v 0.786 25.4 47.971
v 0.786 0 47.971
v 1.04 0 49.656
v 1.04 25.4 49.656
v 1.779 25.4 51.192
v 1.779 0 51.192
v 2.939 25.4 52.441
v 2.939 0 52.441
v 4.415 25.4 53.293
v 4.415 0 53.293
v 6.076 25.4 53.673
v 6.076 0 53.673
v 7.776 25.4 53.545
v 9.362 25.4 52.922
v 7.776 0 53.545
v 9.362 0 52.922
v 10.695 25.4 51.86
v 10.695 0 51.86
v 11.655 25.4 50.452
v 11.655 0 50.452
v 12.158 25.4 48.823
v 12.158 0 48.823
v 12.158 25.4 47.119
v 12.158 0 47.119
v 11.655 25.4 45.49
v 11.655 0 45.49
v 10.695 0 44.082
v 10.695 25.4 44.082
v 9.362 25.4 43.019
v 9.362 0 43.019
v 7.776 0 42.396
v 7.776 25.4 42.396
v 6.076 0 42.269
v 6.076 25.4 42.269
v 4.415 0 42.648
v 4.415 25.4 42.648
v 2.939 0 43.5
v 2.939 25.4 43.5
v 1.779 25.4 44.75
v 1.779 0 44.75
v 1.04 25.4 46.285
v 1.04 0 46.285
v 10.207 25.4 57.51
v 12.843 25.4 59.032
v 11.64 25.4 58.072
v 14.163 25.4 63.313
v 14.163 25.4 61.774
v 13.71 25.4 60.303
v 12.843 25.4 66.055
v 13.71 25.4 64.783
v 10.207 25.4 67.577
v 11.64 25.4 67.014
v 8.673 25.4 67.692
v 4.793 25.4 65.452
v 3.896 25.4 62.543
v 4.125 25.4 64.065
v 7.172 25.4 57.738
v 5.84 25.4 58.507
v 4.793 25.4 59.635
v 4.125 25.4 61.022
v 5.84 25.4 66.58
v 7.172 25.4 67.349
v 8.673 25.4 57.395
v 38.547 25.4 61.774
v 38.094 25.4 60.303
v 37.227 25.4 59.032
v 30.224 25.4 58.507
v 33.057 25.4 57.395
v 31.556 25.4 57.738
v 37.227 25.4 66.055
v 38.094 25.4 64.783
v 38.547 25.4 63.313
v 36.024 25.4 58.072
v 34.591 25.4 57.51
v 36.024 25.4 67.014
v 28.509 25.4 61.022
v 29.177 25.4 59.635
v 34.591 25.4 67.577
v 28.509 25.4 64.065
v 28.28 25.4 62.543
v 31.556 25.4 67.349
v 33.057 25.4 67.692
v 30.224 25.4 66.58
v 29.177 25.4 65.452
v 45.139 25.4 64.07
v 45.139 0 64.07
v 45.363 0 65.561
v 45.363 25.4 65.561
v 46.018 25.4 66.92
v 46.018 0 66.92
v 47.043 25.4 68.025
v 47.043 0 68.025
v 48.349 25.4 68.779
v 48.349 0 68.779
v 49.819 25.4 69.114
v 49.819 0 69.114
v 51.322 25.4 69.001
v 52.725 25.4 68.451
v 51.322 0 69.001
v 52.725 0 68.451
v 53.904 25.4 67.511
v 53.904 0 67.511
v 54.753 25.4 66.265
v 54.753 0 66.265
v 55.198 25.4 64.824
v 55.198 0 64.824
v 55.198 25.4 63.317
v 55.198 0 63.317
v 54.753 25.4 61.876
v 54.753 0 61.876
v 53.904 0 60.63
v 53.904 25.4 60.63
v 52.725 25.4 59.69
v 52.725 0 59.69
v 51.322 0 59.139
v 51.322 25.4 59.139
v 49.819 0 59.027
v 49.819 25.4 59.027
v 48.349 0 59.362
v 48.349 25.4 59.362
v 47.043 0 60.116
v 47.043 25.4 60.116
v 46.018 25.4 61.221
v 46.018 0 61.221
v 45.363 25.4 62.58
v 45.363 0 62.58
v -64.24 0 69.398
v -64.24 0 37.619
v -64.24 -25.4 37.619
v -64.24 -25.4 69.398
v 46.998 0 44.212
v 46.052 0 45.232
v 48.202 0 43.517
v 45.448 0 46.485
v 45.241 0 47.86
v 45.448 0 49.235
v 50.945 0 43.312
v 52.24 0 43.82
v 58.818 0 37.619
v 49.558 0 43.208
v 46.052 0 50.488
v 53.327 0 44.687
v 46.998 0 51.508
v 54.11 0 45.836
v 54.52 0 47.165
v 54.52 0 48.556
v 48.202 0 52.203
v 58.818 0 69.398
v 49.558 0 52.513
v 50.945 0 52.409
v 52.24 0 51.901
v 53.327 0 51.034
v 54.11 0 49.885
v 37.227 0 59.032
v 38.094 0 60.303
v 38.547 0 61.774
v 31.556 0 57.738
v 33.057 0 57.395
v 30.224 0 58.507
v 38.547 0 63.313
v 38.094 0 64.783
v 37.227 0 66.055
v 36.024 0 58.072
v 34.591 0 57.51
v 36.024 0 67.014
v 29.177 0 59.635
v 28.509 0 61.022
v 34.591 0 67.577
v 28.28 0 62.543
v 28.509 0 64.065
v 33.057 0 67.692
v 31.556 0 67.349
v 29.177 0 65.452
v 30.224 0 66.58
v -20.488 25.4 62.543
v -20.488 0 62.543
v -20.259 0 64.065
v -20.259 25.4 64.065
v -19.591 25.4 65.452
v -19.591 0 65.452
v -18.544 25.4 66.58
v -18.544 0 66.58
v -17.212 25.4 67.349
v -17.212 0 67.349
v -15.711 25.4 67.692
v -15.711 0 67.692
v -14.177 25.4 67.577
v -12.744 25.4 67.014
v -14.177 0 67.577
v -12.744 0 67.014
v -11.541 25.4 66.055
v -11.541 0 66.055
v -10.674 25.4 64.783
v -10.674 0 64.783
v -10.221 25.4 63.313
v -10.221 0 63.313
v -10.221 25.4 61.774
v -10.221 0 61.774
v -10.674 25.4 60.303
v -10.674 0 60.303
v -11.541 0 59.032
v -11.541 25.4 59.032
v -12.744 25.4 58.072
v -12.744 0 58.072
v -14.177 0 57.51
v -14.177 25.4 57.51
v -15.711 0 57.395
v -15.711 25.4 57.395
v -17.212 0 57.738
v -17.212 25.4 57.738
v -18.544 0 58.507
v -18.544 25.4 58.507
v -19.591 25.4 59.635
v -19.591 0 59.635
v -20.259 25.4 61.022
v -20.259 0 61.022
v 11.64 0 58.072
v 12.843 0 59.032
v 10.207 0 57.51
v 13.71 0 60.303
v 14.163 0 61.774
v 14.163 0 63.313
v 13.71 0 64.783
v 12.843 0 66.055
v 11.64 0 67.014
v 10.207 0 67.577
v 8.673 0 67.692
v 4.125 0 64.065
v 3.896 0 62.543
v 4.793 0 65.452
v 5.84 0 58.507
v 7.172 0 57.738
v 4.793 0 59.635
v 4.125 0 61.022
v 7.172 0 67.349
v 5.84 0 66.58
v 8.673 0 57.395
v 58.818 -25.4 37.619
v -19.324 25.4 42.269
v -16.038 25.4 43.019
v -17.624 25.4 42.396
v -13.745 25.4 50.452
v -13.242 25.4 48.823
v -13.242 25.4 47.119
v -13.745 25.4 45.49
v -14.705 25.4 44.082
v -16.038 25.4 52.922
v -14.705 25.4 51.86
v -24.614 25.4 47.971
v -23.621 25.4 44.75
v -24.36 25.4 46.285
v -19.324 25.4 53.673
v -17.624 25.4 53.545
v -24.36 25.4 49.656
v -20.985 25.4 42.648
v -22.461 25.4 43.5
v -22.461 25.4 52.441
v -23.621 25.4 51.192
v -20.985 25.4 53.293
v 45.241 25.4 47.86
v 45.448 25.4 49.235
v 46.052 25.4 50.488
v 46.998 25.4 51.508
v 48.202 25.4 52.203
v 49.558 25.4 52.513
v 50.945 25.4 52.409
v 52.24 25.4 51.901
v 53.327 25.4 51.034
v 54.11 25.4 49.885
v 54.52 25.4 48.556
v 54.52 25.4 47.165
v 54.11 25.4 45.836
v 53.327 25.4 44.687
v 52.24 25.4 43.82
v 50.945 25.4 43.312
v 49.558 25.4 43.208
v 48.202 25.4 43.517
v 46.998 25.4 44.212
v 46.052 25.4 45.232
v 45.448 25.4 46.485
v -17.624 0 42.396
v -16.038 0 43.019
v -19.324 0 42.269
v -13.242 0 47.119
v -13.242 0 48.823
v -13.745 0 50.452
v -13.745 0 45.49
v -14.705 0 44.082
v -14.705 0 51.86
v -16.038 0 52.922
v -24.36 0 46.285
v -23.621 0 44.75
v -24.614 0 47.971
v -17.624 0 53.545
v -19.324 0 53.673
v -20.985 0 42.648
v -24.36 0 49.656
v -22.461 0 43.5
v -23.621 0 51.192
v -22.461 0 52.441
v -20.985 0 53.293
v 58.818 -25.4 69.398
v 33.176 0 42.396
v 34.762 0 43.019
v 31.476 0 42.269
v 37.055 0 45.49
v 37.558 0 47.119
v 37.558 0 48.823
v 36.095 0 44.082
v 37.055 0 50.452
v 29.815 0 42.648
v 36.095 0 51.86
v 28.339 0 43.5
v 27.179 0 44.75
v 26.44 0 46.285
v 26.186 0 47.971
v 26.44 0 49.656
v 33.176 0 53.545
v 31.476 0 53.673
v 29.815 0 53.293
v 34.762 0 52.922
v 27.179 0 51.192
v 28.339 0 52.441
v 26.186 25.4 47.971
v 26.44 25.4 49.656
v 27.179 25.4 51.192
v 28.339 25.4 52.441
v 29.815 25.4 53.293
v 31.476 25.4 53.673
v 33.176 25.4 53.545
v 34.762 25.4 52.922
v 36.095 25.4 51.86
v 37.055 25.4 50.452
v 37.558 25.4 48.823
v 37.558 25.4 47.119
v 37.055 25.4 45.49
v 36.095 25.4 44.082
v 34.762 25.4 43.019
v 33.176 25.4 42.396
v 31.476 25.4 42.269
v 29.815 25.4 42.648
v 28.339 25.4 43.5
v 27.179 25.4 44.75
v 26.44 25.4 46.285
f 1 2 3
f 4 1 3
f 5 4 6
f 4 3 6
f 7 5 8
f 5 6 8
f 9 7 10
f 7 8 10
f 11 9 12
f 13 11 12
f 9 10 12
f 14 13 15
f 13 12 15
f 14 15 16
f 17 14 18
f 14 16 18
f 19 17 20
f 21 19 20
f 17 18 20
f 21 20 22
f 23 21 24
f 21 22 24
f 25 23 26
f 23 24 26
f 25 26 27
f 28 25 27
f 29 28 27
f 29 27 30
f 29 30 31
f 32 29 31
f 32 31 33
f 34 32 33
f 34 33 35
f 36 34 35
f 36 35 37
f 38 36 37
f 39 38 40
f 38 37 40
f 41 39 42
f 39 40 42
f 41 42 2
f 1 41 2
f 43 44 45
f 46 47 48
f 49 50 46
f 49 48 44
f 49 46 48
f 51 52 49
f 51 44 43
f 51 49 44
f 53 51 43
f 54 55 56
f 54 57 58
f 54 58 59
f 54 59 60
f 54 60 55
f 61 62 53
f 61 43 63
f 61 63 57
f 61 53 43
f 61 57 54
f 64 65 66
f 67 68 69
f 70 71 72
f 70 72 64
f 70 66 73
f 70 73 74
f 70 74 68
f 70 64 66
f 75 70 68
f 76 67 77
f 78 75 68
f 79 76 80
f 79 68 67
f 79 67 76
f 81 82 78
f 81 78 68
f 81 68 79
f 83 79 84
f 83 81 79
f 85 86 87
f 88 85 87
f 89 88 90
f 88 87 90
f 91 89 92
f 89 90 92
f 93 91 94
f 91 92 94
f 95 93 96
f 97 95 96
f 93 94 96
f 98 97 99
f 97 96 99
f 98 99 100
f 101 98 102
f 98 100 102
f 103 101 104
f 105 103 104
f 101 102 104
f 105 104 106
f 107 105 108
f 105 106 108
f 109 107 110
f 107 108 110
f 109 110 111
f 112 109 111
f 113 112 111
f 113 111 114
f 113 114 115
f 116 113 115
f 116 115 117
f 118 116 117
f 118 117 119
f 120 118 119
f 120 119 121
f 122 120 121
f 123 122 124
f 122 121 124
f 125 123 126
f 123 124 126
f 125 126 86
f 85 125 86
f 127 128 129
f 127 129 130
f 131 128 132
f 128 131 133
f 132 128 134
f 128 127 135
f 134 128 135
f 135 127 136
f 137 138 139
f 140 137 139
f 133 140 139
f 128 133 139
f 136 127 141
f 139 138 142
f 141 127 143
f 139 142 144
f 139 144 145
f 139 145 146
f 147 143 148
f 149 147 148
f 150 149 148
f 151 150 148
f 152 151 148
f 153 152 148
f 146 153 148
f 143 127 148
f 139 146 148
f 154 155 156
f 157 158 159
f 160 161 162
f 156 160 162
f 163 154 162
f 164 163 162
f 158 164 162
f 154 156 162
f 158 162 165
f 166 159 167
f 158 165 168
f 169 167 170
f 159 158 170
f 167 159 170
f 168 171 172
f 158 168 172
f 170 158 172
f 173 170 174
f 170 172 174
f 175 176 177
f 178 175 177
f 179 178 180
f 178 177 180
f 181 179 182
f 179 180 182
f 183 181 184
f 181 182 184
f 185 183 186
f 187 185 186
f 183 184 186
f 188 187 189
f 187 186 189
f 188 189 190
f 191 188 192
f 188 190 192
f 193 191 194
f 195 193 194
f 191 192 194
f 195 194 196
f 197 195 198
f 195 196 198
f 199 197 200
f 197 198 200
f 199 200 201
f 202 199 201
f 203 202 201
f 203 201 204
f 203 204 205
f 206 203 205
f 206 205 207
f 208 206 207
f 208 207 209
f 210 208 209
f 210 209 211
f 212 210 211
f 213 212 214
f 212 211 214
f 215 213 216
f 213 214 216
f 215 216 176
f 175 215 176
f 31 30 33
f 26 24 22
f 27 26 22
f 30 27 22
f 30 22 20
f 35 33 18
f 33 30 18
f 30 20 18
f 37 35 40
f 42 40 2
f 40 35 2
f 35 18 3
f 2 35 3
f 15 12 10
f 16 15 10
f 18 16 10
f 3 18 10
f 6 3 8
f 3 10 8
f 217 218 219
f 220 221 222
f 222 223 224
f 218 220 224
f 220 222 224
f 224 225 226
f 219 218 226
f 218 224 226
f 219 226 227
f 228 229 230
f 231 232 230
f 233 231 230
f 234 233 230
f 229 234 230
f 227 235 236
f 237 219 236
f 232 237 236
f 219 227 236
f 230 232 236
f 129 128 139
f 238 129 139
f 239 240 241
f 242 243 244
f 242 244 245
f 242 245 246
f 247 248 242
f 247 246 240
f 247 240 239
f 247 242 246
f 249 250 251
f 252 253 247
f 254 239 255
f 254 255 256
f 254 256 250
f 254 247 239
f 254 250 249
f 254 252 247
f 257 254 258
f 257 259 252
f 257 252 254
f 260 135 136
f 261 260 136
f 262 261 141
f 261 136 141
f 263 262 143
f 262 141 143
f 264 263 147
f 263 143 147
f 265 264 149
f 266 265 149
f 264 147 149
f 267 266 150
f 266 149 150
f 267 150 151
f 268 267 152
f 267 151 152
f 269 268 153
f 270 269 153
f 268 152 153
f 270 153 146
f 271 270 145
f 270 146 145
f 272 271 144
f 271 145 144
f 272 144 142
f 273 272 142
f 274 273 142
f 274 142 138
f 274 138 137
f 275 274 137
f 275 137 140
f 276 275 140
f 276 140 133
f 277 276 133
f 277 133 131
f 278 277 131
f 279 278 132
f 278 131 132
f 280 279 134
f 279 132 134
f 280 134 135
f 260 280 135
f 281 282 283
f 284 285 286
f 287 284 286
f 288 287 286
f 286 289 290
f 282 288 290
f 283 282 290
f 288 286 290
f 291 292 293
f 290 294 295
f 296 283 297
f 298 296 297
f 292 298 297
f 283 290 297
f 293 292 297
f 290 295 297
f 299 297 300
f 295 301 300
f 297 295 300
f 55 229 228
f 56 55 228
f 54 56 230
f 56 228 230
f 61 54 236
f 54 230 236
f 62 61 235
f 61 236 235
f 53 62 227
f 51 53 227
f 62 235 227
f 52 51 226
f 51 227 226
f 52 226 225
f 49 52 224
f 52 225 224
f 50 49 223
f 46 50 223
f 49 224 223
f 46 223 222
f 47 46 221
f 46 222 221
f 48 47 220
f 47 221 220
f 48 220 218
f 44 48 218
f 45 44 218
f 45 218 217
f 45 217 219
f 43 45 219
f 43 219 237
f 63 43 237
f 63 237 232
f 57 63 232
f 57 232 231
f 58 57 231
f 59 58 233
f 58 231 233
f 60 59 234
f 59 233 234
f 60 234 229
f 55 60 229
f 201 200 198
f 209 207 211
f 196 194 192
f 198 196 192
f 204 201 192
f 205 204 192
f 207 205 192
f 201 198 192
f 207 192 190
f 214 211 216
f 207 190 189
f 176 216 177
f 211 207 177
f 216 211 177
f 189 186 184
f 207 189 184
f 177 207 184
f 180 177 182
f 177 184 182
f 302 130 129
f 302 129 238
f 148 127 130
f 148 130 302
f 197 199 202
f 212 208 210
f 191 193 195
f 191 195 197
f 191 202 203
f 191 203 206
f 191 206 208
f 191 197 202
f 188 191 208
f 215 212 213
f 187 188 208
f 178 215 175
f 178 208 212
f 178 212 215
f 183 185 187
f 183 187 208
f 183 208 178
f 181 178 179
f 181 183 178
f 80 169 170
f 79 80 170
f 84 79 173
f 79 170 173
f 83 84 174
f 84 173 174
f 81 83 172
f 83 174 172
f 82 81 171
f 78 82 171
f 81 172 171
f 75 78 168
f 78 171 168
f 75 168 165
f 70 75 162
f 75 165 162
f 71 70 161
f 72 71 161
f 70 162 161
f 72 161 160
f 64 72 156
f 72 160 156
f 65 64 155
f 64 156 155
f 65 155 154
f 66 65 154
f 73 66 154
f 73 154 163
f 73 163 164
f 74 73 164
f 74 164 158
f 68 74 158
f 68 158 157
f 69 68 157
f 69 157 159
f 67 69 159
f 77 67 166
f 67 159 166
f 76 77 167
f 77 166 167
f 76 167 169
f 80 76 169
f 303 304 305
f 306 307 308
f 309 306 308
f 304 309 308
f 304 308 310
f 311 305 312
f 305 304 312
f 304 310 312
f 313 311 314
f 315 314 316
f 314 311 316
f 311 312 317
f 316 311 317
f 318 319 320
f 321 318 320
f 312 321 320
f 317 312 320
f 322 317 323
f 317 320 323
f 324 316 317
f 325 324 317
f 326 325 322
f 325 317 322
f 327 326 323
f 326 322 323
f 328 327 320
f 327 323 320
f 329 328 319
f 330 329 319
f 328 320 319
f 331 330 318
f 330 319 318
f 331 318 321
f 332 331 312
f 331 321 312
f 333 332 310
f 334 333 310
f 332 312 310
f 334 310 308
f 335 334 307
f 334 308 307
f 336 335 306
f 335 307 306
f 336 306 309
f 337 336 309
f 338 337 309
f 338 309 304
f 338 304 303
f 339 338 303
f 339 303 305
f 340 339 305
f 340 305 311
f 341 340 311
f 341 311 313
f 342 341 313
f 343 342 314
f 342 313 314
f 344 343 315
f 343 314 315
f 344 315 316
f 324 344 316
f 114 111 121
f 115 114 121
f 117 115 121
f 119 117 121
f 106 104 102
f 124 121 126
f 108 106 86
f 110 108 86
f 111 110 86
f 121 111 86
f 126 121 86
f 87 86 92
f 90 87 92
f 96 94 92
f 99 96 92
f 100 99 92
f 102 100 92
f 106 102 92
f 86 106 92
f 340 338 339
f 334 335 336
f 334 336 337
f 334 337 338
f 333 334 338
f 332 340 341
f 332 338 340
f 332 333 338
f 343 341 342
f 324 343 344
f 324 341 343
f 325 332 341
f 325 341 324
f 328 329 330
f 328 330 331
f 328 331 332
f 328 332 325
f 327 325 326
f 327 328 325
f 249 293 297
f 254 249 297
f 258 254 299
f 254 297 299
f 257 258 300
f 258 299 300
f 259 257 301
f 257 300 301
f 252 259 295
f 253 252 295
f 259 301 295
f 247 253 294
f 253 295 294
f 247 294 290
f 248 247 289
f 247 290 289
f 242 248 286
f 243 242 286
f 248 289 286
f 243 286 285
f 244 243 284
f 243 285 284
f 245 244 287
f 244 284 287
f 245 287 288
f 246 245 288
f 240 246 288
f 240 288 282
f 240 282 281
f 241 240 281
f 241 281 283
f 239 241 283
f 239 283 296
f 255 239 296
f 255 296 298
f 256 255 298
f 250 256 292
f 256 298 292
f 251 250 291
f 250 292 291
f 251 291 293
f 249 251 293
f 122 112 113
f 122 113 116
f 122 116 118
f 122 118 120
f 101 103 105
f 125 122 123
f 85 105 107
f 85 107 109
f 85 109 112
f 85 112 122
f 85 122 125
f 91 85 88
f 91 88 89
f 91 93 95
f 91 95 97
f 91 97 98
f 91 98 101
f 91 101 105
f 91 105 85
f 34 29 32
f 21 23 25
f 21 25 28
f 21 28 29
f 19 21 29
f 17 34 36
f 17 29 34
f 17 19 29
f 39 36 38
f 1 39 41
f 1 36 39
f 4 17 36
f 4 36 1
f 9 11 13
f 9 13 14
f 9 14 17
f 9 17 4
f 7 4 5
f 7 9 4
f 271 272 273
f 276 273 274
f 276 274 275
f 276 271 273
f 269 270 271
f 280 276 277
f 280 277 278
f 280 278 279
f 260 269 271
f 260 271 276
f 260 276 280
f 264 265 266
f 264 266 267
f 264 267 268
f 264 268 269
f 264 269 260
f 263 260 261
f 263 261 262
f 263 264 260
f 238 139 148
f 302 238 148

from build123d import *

# Parameters (mm, degrees)
F0_W     = 123.0572126806
F0_H     = 31.779345125
F1_DEPTH = 25.4
F2_R     = 5.0577468646
F3_DEPTH = 25.4
F4_R     = 4.6656704546
F5_DEPTH = 25.4
F6_R     = 5.7177995667
F7_DEPTH = 25.4
F8_R     = 5.1626495497
F9_DEPTH = 25.4


# Not quite as in the source:
# - a feature names something its author has since deleted; it is built from what else it names


with BuildPart() as f1:
    # F0 (on Front) → F1 (new body)
    with BuildSketch(Plane.XZ):
        with Locations((-2.7109328657, 53.5084176809)):
            Rectangle(F0_W, F0_H)
    extrude(amount=F1_DEPTH)

    # F4 (on face) → F5 (join)
    with BuildSketch(Plane(origin=(0, 0, 0), x_dir=(-1, 0, 0), z_dir=(0, 1, 0))):
        with Locations((-49.9067381024, 47.8602088988)):
            Circle(F4_R)
    extrude(amount=F5_DEPTH)


with BuildPart() as f3:
    # F2 (on face) → F3 (new body)
    with BuildSketch(Plane(origin=(0, 0, 0), x_dir=(-1, 0, 0), z_dir=(0, 1, 0))):
        with Locations((-50.196506083, 64.0703812242)):
            Circle(F2_R)
    extrude(amount=F3_DEPTH)


with BuildPart() as f7:
    # F6 (on face) → F7 (new body)
    with BuildSketch(Plane(origin=(0, 0, 0), x_dir=(-1, 0, 0), z_dir=(0, 1, 0))):
        with Locations((-31.9035984576, 47.9707233608)):
            Circle(F6_R)
    extrude(amount=F7_DEPTH)


with BuildPart() as f7b:
    # F6 (on face) → F7, piece 2 (new body)
    with BuildSketch(Plane(origin=(0, 0, 0), x_dir=(-1, 0, 0), z_dir=(0, 1, 0))):
        with Locations((-6.5035984576, 47.9707233608)):
            Circle(F6_R)
    extrude(amount=F7_DEPTH)


with BuildPart() as f7c:
    # F6 (on face) → F7, piece 3 (new body)
    with BuildSketch(Plane(origin=(0, 0, 0), x_dir=(-1, 0, 0), z_dir=(0, 1, 0))):
        with Locations((18.8964015424, 47.9707233608)):
            Circle(F6_R)
    extrude(amount=F7_DEPTH)


with BuildPart() as f9:
    # F8 (on face) → F9 (new body)
    with BuildSketch(Plane(origin=(0, 0, 0), x_dir=(-1, 0, 0), z_dir=(0, 1, 0))):
        with Locations((-33.4423966706, 62.5433772802)):
            Circle(F8_R)
    extrude(amount=F9_DEPTH)


with BuildPart() as f9b:
    # F8 (on face) → F9, piece 2 (new body)
    with BuildSketch(Plane(origin=(0, 0, 0), x_dir=(-1, 0, 0), z_dir=(0, 1, 0))):
        with Locations((-9.0583966706, 62.5433772802)):
            Circle(F8_R)
    extrude(amount=F9_DEPTH)


with BuildPart() as f9c:
    # F8 (on face) → F9, piece 3 (new body)
    with BuildSketch(Plane(origin=(0, 0, 0), x_dir=(-1, 0, 0), z_dir=(0, 1, 0))):
        with Locations((15.3256033294, 62.5433772802)):
            Circle(F8_R)
    extrude(amount=F9_DEPTH)


solid = Compound([f1.part, f3.part, f7.part, f7b.part, f7c.part, f9.part, f9b.part, f9c.part])
